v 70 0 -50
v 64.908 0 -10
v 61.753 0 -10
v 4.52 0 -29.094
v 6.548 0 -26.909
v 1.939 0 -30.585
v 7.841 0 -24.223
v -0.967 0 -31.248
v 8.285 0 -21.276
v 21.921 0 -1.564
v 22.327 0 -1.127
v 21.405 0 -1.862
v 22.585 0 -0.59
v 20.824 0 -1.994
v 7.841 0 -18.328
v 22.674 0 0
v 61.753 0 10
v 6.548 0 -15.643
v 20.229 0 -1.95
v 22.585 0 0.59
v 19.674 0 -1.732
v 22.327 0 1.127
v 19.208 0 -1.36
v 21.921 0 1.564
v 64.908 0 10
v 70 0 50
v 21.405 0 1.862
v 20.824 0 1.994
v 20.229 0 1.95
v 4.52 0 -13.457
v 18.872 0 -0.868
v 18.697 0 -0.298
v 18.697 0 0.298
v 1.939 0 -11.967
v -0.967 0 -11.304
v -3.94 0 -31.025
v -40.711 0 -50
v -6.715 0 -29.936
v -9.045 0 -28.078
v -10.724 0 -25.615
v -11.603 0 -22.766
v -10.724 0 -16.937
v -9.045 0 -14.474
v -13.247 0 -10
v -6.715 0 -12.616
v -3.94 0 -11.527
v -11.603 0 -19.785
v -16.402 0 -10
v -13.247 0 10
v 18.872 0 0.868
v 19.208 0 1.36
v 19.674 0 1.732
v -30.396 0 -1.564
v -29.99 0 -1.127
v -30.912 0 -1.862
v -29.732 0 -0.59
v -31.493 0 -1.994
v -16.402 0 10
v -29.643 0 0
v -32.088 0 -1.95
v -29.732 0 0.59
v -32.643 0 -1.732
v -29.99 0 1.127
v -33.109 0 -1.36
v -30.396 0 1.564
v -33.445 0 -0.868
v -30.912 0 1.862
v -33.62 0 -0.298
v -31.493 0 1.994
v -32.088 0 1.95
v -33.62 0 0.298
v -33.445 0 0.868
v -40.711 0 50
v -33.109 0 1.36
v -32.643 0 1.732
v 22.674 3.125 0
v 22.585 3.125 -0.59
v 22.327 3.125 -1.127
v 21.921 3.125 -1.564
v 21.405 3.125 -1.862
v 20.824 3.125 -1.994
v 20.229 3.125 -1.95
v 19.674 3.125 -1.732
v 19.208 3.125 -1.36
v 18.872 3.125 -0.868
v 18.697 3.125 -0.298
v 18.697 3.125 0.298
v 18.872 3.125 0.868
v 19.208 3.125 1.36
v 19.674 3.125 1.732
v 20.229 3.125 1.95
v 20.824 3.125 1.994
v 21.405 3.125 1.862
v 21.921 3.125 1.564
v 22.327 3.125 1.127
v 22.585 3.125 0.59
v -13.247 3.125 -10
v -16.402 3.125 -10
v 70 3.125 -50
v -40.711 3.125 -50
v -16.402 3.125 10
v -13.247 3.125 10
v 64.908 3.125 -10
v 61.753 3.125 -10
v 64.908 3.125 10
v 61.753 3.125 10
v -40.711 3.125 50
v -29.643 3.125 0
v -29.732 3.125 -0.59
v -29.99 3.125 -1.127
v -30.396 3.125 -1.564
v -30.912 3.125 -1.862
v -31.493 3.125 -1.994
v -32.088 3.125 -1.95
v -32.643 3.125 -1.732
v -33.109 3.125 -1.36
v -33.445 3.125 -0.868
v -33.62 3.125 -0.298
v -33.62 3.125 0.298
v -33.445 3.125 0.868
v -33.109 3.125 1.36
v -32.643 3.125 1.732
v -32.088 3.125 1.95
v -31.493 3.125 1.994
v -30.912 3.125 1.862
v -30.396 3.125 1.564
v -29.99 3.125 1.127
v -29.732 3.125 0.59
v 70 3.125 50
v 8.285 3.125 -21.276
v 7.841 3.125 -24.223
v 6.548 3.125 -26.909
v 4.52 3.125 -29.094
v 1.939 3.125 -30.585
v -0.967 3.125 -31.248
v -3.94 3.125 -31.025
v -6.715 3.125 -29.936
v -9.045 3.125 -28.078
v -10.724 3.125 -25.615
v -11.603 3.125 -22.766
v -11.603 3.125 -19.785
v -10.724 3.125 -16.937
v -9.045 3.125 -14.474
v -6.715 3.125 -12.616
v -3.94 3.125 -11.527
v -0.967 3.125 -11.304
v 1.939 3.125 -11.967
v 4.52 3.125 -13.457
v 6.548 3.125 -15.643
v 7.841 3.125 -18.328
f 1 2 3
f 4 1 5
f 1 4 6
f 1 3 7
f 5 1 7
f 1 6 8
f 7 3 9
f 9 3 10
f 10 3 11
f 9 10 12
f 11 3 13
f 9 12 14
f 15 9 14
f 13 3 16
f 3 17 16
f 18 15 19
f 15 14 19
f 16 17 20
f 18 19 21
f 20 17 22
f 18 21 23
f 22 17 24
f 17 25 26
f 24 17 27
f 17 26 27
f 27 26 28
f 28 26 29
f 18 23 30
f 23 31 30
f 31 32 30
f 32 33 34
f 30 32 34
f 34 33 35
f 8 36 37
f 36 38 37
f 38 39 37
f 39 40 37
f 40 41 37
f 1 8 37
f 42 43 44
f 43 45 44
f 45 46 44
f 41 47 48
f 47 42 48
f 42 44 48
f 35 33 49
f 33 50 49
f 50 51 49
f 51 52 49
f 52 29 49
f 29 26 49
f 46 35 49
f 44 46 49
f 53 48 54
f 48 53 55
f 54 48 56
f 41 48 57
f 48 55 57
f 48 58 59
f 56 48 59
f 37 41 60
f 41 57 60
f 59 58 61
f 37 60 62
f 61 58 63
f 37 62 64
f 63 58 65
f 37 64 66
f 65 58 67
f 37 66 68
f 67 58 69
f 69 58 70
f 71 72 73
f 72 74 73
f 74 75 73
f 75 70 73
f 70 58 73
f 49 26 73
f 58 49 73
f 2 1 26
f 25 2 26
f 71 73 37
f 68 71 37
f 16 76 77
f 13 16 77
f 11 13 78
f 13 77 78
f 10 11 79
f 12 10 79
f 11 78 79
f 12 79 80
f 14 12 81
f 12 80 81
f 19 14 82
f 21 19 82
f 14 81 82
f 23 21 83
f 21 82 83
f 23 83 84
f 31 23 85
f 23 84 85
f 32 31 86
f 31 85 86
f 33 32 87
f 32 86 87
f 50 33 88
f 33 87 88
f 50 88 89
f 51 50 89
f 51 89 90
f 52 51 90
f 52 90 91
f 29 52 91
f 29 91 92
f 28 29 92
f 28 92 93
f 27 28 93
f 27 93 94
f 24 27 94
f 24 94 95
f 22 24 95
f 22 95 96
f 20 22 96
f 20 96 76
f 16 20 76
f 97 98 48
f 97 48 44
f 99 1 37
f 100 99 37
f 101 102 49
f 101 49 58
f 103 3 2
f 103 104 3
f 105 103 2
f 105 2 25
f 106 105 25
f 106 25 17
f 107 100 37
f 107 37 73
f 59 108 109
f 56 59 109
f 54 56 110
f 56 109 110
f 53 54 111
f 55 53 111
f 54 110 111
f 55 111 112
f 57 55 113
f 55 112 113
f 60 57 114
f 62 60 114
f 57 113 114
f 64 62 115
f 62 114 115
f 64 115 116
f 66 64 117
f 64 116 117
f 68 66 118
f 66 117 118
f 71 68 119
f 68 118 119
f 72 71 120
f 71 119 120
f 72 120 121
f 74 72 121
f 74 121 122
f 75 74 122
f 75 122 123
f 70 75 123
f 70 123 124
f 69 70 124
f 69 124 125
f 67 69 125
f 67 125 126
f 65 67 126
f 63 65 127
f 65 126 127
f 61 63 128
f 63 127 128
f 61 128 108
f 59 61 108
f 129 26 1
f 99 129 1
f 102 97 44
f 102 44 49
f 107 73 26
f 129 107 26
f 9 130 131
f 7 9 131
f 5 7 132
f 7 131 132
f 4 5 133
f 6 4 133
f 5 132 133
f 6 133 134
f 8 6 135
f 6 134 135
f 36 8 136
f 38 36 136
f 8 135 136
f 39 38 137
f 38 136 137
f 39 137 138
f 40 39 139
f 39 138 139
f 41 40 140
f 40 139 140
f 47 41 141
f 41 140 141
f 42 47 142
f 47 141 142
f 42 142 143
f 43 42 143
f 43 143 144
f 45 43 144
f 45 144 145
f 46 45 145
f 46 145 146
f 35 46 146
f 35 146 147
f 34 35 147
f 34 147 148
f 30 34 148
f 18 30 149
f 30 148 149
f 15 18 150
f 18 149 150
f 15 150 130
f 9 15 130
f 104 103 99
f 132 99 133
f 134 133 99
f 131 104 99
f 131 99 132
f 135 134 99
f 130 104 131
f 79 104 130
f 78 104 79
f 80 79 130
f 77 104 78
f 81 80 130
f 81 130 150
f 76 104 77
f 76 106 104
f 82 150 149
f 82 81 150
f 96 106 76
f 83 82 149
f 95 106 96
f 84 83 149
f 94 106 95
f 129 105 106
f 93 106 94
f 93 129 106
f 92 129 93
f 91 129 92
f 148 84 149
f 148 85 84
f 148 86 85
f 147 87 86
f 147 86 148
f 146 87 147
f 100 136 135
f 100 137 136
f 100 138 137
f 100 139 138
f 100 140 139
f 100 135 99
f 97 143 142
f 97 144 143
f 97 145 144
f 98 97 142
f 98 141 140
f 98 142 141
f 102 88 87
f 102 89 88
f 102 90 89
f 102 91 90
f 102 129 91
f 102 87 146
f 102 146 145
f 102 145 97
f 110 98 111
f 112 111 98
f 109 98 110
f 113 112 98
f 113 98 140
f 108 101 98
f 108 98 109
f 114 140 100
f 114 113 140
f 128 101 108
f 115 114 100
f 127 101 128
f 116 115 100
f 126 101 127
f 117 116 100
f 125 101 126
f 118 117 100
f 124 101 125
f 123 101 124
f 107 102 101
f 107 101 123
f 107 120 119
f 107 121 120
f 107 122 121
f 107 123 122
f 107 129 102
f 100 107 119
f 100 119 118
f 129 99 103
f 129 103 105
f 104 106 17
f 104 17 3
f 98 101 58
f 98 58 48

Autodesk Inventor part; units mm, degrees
ref_plane "YZ Plane" through (0, 0, 0) normal (1, 0, 0) x (0, 1, 0)
ref_plane "XZ Plane" through (0, 0, 0) normal (0, 1, 0) x (-1, 0, 0)
ref_plane "XY Plane" through (0, 0, 0) normal (0, 0, 1) x (1, 0, 0)
sketch "Sketch1" plane through (0, 0, 0) normal (0, 1, 0) x (-1, 0, 0)
  line L0 (70, 50) -> (-70, 50)
  line L1 (-70, 50) -> (-70, -50)
  line L2 (-70, -50) -> (70, -50)
  line L3 (70, -50) -> (70, 50)
  line L4 (70, 50) -> (-70, -50) construction
  line L5 (-70, 50) -> (70, -50) construction
  point P0 (0, 0)
  dimension "d0" = 140
  dimension "d1" = 100
extrude "Extrusion1" add sketch "Sketch1" along normal blind 3.125
sketch "Sketch9" plane through (0, 3.125, 0) normal (0, 1, 0) x (1, 0, 0)
  circle A0 centre (-1.7146, 21.2758) radius 10
  point P0 (0, 0)
  dimension "d41" = 20
extrude "Extrusion9" cut sketch "Sketch9" against normal blind 10
sketch "Sketch10" plane through (0, 3.125, 0) normal (0, 1, 0) x (1, 0, 0)
  circle A0 centre (-31.6428, 0) radius 2
  point P0 (0, 0)
  dimension "d44" = 4
extrude "Extrusion10" cut sketch "Sketch10" against normal blind 5
sketch "Sketch11" plane through (0, 3.125, 0) normal (0, 1, 0) x (1, 0, 0)
  circle A0 centre (20.6742, 0) radius 2
  point P0 (0, 0)
  dimension "d47" = 4
extrude "Extrusion11" cut sketch "Sketch11" against normal blind 5
sketch "Sketch15" plane through (0, 3.125, 0) normal (0, 1, 0) x (1, 0, 0)
  line L0 (-16.402, 10) -> (-13.247, 10)
  line L1 (-13.247, 10) -> (-13.247, -10)
  line L2 (-13.247, -10) -> (-16.402, -10)
  line L3 (-16.402, -10) -> (-16.402, 10)
  line L4 (-16.402, 10) -> (-13.247, -10) construction
  line L5 (-13.247, 10) -> (-16.402, -10) construction
  line L6 (61.753, 10) -> (64.908, 10)
  line L7 (64.908, 10) -> (64.908, -10)
  line L8 (64.908, -10) -> (61.753, -10)
  line L9 (61.753, -10) -> (61.753, 10)
  line L10 (61.753, 10) -> (64.908, -10) construction
  line L11 (64.908, 10) -> (61.753, -10) construction
  point P0 (0, 0)
  point P1 (-14.8245, 0)
  point P2 (63.3305, 0)
  dimension "d68" = 3.155
  dimension "d69" = 20
  dimension "d70" = 3.155
  dimension "d71" = 20
  dimension "d72" = 75
extrude "Extrusion14" cut sketch "Sketch15" against normal blind 3.125
sketch "Sketch16" plane through (0, 3.125, 0) normal (0, 1, 0) x (1, 0, 0)
  line L0 (-70, -50) -> (70, -50) projected
  line L1 (-70, 50) -> (-40.7108, 50)
  line L2 (-40.7108, 50) -> (-40.7108, -50)
  line L3 (-40.7108, -50) -> (-70, -50)
  line L4 (-70, -50) -> (-70, 50)
  point P0 (0, 0)
extrude "Extrusion15" cut sketch "Sketch16" against normal blind 3.125
properties part number "Base"
